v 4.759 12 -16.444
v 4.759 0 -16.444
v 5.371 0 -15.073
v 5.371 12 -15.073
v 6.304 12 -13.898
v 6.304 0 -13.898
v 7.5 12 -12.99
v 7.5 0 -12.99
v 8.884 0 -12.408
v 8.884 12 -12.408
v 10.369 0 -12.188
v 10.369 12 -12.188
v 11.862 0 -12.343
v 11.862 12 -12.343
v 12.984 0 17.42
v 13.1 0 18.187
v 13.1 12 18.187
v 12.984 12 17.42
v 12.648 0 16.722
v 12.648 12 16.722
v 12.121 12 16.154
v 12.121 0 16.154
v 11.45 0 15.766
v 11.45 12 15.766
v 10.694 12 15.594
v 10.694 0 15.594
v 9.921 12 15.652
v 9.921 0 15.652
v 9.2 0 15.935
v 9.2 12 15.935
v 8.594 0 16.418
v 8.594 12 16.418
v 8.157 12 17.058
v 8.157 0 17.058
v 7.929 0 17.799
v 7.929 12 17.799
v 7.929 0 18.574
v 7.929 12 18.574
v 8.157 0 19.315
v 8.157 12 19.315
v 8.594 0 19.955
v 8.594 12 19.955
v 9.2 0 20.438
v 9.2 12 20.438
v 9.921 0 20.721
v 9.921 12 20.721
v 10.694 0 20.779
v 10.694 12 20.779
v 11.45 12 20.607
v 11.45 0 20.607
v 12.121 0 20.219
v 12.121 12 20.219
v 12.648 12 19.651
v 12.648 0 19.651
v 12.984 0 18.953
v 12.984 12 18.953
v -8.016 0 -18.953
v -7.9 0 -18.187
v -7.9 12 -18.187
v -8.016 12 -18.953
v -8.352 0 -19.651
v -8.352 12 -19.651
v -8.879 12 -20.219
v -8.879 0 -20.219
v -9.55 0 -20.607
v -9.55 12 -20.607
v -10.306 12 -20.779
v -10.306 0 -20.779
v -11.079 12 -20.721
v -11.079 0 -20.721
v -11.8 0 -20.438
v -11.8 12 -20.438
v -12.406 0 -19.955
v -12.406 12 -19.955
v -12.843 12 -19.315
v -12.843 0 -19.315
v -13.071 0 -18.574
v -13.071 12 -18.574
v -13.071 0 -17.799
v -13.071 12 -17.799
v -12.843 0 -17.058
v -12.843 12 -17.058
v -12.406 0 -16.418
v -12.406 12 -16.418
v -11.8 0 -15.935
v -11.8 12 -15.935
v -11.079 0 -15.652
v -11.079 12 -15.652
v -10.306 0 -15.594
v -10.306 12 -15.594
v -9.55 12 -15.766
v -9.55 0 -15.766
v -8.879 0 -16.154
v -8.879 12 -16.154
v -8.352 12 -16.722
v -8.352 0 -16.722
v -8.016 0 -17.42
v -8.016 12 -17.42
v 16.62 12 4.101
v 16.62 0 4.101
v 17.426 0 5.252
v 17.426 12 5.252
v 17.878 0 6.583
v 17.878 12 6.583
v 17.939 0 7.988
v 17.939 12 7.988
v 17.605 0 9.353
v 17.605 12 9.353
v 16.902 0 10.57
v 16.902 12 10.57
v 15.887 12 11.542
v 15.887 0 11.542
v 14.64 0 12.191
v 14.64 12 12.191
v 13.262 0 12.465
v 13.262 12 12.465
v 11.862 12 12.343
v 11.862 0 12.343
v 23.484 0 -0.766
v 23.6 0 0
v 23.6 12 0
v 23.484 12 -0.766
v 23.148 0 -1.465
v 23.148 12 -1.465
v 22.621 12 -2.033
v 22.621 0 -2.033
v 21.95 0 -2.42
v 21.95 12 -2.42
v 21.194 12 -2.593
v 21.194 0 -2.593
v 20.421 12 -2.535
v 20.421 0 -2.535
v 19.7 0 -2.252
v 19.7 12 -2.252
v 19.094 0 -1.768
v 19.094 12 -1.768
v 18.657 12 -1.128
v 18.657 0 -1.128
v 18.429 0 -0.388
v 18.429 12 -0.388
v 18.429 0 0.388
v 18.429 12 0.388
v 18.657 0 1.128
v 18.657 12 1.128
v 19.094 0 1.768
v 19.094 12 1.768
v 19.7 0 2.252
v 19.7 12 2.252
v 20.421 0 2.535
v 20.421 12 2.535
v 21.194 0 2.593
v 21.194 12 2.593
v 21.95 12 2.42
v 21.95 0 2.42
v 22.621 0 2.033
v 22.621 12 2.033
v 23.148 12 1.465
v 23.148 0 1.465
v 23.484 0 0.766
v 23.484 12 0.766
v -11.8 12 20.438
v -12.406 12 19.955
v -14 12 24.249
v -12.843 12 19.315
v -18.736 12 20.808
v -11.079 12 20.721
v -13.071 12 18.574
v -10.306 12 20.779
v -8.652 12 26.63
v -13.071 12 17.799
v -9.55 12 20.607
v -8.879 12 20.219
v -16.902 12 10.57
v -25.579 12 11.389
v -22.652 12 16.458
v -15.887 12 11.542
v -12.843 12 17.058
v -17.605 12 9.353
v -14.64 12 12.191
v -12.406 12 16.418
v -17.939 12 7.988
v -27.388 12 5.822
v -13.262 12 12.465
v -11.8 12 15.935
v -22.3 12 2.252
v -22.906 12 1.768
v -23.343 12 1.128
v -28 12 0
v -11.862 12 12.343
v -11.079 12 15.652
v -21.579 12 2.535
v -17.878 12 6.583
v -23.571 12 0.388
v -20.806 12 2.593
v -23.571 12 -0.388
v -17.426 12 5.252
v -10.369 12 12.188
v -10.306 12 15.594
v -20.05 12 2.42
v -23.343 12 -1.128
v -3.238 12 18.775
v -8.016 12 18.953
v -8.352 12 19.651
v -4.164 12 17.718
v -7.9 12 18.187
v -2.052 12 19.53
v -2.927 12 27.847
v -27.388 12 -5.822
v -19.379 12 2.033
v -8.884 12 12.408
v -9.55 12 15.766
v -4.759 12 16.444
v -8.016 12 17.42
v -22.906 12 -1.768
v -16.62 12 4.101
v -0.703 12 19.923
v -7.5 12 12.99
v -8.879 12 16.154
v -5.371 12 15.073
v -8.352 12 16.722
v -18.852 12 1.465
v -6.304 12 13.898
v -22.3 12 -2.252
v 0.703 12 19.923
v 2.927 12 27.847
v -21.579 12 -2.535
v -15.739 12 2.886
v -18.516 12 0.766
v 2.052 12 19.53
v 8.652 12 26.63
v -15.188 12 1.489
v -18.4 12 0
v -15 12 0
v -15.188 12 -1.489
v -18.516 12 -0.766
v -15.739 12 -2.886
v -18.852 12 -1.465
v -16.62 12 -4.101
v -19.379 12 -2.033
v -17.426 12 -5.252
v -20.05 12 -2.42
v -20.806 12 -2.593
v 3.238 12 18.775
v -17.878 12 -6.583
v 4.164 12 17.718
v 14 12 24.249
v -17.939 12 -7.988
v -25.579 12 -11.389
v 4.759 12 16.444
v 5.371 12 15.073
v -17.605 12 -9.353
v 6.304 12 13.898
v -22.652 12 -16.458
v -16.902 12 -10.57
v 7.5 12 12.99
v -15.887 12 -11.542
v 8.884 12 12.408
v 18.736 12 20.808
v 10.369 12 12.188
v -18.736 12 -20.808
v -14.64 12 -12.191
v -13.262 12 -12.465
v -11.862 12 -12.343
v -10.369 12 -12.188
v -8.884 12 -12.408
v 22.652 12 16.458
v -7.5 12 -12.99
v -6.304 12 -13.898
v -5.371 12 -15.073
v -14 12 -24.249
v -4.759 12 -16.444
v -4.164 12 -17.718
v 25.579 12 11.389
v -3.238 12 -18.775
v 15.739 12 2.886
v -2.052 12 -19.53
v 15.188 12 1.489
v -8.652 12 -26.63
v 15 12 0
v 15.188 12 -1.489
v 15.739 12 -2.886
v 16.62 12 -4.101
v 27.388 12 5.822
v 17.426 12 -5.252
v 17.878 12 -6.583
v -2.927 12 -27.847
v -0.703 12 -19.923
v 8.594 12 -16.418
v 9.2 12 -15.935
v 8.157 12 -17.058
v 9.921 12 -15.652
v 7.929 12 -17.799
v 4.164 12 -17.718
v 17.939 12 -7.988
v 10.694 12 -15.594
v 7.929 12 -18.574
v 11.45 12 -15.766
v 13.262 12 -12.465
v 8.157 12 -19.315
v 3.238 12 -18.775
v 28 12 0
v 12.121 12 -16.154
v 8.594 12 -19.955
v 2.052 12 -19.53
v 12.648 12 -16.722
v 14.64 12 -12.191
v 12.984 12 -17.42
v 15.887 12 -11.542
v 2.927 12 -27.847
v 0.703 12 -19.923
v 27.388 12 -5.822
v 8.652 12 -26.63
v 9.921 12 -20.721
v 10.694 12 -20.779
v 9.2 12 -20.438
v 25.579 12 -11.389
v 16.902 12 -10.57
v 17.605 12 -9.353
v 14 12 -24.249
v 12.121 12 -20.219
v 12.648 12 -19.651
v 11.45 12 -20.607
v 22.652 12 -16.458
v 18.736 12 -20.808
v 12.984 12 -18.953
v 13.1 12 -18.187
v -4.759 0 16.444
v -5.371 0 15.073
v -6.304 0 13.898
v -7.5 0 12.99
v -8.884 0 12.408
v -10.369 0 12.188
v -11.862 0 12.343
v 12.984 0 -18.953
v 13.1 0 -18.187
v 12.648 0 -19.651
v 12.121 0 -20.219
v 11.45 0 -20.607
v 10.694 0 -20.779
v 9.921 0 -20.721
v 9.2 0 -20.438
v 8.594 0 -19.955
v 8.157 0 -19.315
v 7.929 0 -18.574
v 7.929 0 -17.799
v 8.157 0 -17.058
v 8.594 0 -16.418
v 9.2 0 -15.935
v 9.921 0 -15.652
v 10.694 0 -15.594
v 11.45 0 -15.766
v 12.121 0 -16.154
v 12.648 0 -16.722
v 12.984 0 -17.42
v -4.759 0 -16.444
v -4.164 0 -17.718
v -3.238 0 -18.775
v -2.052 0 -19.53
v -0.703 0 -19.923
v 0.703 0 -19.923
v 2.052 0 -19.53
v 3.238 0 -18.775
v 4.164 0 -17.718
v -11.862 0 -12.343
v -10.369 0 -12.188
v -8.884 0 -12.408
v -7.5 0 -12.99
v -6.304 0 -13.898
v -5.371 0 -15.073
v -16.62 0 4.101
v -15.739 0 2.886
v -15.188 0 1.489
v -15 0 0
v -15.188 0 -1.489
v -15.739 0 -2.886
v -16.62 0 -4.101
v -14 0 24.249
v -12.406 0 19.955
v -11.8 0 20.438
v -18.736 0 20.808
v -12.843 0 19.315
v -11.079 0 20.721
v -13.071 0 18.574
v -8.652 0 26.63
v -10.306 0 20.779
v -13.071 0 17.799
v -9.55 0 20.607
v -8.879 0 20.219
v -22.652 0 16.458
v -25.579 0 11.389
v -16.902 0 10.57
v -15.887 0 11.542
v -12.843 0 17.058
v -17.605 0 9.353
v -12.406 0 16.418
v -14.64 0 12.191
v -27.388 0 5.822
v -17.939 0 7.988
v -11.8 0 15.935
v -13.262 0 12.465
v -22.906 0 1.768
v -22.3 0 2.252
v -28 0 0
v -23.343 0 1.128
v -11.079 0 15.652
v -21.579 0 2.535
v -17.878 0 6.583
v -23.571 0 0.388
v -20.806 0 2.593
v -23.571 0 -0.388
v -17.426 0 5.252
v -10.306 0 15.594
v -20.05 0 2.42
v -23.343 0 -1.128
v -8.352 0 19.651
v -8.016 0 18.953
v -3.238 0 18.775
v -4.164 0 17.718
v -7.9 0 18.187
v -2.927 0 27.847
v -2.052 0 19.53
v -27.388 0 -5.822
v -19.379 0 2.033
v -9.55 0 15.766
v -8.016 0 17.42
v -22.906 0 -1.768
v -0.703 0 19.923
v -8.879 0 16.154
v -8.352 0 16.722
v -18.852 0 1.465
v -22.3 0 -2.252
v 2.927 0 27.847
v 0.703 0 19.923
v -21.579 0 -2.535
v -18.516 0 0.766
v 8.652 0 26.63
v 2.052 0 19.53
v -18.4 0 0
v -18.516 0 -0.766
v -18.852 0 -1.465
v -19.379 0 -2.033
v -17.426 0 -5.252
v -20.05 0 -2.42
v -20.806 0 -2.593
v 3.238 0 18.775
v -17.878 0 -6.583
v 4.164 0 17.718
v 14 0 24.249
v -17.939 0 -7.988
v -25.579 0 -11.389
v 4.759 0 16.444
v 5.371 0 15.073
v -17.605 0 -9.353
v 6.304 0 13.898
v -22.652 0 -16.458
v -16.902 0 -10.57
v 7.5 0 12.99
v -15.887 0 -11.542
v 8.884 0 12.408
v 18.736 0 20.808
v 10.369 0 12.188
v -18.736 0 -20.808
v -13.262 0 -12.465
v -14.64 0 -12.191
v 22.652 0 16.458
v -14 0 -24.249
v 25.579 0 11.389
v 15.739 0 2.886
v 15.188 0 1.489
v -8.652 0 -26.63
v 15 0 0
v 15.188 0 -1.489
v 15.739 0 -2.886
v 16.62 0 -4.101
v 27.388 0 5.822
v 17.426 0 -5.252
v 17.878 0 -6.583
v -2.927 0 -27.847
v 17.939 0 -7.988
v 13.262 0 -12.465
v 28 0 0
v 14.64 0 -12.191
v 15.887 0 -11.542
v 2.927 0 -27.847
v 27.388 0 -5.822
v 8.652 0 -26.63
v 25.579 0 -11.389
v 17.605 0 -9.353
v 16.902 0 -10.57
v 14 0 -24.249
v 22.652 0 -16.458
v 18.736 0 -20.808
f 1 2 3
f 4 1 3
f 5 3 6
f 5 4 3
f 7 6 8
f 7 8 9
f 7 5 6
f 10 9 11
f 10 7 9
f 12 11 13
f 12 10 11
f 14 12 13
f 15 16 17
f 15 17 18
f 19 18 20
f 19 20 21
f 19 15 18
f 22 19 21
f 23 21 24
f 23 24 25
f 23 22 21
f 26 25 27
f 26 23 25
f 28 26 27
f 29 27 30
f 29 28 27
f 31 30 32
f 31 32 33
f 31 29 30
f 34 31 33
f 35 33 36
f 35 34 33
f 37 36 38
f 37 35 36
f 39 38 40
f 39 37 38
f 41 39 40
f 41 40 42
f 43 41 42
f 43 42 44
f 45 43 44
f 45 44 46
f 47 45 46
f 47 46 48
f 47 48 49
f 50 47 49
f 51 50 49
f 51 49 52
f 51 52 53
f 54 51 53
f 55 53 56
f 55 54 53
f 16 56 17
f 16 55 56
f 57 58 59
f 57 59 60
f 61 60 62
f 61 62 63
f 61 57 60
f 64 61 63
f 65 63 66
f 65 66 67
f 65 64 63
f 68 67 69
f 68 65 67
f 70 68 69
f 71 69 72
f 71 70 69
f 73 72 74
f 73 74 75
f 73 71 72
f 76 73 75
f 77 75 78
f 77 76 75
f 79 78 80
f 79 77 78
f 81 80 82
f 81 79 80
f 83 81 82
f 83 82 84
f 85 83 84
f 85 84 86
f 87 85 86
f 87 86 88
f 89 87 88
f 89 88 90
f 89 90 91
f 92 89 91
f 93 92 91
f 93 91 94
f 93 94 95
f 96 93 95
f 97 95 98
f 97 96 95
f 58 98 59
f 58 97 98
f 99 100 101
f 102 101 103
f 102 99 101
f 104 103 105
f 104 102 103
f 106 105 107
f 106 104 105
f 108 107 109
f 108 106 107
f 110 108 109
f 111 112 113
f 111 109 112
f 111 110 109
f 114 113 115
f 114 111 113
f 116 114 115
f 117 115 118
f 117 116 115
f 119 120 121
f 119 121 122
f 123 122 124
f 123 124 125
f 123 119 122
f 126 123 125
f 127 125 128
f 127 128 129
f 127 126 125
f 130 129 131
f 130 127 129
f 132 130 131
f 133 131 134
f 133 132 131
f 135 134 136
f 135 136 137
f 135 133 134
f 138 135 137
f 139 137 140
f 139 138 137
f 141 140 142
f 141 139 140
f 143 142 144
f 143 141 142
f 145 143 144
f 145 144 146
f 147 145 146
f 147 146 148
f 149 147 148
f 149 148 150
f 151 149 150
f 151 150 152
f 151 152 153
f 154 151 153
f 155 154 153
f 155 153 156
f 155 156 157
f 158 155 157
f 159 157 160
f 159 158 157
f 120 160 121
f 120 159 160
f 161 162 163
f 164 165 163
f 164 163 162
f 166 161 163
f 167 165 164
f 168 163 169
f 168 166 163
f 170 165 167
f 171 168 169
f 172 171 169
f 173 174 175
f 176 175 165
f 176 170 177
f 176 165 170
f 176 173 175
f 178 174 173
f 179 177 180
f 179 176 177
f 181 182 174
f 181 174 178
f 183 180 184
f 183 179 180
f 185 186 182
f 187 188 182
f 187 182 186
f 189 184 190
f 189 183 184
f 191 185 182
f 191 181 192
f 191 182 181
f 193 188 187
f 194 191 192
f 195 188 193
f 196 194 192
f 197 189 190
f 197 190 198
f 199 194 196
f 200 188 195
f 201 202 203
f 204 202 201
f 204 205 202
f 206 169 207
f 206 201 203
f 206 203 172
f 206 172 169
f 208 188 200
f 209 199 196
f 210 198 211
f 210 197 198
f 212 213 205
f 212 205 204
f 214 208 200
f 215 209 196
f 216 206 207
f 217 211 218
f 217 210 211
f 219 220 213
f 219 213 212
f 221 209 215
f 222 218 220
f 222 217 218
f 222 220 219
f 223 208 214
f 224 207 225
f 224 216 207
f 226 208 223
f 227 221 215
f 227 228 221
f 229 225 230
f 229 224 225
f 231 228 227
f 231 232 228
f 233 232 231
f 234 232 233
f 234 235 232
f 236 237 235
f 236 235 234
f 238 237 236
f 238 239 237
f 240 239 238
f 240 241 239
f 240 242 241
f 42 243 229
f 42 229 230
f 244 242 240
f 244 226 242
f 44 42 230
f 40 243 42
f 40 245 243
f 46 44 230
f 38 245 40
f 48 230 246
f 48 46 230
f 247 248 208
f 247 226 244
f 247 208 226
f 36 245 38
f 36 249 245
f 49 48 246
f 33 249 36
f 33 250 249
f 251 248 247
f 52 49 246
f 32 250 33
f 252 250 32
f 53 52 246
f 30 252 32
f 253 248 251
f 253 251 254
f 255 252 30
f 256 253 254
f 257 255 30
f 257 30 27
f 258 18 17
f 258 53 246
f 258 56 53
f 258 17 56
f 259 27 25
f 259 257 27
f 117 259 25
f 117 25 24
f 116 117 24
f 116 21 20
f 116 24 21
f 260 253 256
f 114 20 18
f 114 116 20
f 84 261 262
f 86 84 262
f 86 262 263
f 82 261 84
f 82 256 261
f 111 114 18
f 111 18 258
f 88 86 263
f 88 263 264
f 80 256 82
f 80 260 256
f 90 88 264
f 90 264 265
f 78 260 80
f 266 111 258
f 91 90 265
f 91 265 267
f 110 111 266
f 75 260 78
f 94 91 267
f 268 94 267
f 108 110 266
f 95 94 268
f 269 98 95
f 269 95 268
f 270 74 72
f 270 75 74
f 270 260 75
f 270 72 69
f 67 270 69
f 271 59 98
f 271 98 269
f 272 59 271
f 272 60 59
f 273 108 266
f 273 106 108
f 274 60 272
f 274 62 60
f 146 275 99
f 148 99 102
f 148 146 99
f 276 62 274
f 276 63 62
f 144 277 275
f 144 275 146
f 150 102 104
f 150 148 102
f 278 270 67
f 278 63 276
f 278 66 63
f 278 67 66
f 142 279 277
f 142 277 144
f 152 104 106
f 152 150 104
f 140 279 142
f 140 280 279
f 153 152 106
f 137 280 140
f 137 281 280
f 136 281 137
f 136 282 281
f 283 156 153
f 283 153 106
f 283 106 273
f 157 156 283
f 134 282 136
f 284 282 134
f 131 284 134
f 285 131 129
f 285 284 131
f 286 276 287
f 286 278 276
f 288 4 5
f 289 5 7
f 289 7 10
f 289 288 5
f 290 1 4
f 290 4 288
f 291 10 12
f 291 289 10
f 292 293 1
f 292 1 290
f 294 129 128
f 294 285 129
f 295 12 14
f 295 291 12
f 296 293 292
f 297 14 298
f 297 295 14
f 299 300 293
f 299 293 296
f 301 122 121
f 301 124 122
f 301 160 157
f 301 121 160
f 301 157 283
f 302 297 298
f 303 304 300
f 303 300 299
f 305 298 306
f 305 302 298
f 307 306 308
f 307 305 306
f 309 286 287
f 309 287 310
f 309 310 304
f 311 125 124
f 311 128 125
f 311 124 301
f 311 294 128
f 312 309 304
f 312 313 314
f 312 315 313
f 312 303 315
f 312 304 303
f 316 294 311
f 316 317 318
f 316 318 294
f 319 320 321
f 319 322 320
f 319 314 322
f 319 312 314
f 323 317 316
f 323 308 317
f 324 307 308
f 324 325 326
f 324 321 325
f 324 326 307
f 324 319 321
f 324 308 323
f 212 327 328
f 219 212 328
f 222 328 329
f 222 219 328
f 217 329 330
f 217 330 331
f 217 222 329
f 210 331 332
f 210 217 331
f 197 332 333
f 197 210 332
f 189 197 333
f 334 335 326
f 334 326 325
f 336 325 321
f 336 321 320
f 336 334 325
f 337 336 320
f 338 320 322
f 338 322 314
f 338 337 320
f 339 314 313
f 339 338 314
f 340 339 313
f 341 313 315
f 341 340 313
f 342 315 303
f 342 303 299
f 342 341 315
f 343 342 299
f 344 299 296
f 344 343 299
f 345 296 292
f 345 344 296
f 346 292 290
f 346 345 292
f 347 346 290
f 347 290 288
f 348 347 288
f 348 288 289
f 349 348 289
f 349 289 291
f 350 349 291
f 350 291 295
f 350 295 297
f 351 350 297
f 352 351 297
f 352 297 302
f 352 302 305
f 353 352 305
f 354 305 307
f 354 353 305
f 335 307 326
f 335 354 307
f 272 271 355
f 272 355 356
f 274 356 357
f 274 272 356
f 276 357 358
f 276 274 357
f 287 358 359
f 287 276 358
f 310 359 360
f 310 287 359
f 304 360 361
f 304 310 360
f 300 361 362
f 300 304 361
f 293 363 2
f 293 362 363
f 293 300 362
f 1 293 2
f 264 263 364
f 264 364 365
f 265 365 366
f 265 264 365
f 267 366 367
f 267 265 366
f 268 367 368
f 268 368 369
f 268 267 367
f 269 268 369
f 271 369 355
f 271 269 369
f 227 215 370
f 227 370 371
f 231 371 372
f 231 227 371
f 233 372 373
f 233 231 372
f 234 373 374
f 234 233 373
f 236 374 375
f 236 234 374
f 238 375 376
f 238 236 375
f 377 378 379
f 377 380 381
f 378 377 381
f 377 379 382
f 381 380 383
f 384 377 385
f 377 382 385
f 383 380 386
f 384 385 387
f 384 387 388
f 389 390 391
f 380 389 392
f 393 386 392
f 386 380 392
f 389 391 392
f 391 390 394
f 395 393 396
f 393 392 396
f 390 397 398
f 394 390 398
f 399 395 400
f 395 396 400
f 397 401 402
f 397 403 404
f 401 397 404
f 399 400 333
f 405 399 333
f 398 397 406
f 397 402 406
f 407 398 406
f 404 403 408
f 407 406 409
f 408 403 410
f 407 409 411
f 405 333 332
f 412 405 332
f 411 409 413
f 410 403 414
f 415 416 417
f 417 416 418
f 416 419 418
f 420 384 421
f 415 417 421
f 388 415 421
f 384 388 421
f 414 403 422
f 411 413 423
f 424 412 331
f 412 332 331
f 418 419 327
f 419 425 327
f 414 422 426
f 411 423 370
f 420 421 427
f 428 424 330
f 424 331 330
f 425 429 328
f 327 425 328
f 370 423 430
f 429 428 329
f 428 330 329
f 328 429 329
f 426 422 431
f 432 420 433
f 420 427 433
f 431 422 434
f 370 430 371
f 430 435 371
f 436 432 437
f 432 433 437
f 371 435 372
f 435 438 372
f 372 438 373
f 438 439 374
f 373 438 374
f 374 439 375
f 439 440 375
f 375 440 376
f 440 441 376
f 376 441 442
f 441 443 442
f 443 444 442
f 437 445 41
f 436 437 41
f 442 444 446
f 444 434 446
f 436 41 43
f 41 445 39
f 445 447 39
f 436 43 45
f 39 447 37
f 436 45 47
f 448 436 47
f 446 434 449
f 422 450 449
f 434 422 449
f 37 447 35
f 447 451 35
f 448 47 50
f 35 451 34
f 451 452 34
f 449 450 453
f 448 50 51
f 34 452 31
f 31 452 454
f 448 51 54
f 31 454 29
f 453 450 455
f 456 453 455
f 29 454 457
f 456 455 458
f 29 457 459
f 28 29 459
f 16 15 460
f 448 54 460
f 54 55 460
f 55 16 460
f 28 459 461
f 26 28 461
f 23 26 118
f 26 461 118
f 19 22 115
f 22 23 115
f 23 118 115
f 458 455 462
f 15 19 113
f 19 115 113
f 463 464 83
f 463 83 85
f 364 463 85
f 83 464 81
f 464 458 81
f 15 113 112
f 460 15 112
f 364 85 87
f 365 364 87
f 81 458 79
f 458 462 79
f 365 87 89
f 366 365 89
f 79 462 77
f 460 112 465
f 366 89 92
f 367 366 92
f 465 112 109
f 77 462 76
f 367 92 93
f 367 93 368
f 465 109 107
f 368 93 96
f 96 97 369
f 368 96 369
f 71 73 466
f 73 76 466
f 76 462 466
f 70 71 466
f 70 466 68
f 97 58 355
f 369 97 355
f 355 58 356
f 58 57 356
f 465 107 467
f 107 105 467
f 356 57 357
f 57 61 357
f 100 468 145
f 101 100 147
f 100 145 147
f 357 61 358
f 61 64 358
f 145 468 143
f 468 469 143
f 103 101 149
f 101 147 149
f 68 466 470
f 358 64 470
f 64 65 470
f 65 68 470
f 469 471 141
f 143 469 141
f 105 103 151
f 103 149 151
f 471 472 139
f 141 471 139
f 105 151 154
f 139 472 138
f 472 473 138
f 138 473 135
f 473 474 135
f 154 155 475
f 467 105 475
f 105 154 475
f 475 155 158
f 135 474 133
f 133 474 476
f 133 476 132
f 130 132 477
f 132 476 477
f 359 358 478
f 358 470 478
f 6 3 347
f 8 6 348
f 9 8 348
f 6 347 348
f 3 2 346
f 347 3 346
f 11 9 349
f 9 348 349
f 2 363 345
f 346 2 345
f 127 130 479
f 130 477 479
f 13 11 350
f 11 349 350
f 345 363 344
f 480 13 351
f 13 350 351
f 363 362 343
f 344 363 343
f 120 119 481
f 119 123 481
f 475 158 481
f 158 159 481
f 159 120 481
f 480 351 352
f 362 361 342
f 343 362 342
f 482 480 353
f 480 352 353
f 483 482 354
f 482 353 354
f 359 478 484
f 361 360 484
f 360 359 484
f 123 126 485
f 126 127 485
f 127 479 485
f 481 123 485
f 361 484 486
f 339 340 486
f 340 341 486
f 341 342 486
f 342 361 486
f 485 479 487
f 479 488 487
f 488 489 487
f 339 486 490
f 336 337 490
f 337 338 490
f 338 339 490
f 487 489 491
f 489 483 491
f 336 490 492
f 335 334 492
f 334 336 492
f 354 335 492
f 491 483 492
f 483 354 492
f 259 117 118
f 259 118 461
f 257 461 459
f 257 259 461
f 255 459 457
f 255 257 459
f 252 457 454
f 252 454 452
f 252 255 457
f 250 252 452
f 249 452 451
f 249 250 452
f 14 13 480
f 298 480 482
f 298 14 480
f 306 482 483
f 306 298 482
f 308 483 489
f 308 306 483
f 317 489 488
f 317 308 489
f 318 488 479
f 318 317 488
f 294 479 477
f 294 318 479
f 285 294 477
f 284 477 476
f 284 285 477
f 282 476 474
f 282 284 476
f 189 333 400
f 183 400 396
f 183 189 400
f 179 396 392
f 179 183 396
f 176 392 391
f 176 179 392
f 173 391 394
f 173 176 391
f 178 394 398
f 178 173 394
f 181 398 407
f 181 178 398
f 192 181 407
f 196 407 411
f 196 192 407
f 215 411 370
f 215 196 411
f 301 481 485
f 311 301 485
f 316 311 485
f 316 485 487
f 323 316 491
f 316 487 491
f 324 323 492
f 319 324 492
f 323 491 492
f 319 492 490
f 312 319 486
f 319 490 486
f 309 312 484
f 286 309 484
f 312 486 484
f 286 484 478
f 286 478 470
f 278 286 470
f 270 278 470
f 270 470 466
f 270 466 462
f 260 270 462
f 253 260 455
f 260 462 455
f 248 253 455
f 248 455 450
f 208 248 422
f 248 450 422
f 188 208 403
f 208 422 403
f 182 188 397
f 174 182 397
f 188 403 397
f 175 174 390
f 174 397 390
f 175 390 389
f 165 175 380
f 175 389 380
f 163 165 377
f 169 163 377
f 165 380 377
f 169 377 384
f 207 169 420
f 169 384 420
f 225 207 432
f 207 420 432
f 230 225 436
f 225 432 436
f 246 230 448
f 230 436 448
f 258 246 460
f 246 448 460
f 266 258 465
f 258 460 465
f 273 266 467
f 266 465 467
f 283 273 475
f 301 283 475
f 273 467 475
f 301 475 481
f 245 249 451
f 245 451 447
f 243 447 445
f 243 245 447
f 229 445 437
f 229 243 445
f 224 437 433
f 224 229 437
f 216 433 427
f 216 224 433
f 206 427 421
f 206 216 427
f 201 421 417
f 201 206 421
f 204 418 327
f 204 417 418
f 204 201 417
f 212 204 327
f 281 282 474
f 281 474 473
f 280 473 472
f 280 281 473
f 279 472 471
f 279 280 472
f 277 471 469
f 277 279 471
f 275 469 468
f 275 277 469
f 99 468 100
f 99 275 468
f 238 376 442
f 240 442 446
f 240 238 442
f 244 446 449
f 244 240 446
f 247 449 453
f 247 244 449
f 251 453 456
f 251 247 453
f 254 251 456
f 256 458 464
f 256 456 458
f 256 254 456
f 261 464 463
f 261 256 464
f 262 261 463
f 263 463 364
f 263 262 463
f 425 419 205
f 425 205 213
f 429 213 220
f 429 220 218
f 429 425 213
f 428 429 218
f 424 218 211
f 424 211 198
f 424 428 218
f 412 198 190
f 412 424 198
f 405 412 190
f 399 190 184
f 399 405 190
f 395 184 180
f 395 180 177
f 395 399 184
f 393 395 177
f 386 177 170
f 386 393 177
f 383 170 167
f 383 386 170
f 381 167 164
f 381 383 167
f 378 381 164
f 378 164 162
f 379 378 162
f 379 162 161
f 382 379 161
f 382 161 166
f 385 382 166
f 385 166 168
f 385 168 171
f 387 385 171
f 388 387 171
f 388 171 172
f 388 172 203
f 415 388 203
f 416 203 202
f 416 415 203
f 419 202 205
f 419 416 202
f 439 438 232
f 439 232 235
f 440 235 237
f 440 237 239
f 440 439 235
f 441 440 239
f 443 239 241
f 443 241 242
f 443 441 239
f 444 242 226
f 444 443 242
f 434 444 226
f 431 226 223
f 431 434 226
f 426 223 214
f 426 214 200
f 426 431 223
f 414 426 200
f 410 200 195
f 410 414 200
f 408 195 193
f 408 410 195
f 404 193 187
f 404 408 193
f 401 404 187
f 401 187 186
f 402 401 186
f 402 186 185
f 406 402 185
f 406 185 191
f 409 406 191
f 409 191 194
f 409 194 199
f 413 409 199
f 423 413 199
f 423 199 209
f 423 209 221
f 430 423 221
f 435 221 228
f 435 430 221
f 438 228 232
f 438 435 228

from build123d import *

# Parameters (mm, degrees)
SKETCH_1_R               = 28
SKETCH_1_R_2             = 2.6
EXTRUDE_1_DEPTH          = 12
CUT_EXTRUDE_2_DEPTH      = 1
CUT_EXTRUDE_2_DEPTH_BACK = 13


with BuildPart() as part:
    # 草图1 → 凸台-拉伸1 (new body)
    with BuildSketch(Plane(origin=(0, 0, 0), x_dir=(1, 0, 0), z_dir=(0, 1, 0))):
        Circle(SKETCH_1_R)
        with Locations((10.5, 18.186533479)):
            Circle(SKETCH_1_R_2, mode=Mode.SUBTRACT)
        with Locations((21, 0)):
            Circle(SKETCH_1_R_2, mode=Mode.SUBTRACT)
        with Locations((10.5, -18.186533479)):
            Circle(SKETCH_1_R_2, mode=Mode.SUBTRACT)
        with Locations((-10.5, -18.186533479)):
            Circle(SKETCH_1_R_2, mode=Mode.SUBTRACT)
        with Locations((-21, 0)):
            Circle(SKETCH_1_R_2, mode=Mode.SUBTRACT)
        with Locations((-10.5, 18.186533479)):
            Circle(SKETCH_1_R_2, mode=Mode.SUBTRACT)
    extrude(amount=EXTRUDE_1_DEPTH)

    # 草图4 → 切除-拉伸2 (cut, two sides)
    with BuildSketch(Plane(origin=(0, 12, 0), x_dir=(1, 0, 0), z_dir=(0, 1, 0))) as cut_extrude_2_sk:
        with BuildLine():
            ThreePointArc((4.758569662, 16.444127766), (7.500000636, 12.99038069), (11.861748987, 12.343106429))
            ThreePointArc((11.861748987, 12.343106429), (17.297017892, 9.986437089), (16.620317219, 4.10102167))
            ThreePointArc((16.620317219, 4.10102167), (15, -7.34e-07), (16.620318223, -4.101022742))
            ThreePointArc((16.620318223, -4.101022742), (17.297017158, -9.98643836), (11.861747557, -12.343106096))
            ThreePointArc((11.861747557, -12.343106096), (7.499999364, -12.990381424), (4.758569235, -16.444129171))
            ThreePointArc((4.758569235, -16.444129171), (-7.34e-07, -19.972875449), (-4.758569662, -16.444127766))
            ThreePointArc((-4.758569662, -16.444127766), (-7.500000636, -12.99038069), (-11.861748987, -12.343106429))
            ThreePointArc((-11.861748987, -12.343106429), (-17.297017892, -9.986437089), (-16.620317219, -4.10102167))
            ThreePointArc((-16.620317219, -4.10102167), (-15, 7.34e-07), (-16.620318223, 4.101022742))
            ThreePointArc((-16.620318223, 4.101022742), (-17.297017158, 9.98643836), (-11.861747557, 12.343106096))
            ThreePointArc((-11.861747557, 12.343106096), (-7.499999364, 12.990381424), (-4.758569235, 16.444129171))
            ThreePointArc((-4.758569235, 16.444129171), (7.34e-07, 19.972875449), (4.758569662, 16.444127766))
        make_face()
    extrude(amount=CUT_EXTRUDE_2_DEPTH, mode=Mode.SUBTRACT)
    extrude(cut_extrude_2_sk.sketch, amount=-CUT_EXTRUDE_2_DEPTH_BACK, mode=Mode.SUBTRACT)


solid = part.part
